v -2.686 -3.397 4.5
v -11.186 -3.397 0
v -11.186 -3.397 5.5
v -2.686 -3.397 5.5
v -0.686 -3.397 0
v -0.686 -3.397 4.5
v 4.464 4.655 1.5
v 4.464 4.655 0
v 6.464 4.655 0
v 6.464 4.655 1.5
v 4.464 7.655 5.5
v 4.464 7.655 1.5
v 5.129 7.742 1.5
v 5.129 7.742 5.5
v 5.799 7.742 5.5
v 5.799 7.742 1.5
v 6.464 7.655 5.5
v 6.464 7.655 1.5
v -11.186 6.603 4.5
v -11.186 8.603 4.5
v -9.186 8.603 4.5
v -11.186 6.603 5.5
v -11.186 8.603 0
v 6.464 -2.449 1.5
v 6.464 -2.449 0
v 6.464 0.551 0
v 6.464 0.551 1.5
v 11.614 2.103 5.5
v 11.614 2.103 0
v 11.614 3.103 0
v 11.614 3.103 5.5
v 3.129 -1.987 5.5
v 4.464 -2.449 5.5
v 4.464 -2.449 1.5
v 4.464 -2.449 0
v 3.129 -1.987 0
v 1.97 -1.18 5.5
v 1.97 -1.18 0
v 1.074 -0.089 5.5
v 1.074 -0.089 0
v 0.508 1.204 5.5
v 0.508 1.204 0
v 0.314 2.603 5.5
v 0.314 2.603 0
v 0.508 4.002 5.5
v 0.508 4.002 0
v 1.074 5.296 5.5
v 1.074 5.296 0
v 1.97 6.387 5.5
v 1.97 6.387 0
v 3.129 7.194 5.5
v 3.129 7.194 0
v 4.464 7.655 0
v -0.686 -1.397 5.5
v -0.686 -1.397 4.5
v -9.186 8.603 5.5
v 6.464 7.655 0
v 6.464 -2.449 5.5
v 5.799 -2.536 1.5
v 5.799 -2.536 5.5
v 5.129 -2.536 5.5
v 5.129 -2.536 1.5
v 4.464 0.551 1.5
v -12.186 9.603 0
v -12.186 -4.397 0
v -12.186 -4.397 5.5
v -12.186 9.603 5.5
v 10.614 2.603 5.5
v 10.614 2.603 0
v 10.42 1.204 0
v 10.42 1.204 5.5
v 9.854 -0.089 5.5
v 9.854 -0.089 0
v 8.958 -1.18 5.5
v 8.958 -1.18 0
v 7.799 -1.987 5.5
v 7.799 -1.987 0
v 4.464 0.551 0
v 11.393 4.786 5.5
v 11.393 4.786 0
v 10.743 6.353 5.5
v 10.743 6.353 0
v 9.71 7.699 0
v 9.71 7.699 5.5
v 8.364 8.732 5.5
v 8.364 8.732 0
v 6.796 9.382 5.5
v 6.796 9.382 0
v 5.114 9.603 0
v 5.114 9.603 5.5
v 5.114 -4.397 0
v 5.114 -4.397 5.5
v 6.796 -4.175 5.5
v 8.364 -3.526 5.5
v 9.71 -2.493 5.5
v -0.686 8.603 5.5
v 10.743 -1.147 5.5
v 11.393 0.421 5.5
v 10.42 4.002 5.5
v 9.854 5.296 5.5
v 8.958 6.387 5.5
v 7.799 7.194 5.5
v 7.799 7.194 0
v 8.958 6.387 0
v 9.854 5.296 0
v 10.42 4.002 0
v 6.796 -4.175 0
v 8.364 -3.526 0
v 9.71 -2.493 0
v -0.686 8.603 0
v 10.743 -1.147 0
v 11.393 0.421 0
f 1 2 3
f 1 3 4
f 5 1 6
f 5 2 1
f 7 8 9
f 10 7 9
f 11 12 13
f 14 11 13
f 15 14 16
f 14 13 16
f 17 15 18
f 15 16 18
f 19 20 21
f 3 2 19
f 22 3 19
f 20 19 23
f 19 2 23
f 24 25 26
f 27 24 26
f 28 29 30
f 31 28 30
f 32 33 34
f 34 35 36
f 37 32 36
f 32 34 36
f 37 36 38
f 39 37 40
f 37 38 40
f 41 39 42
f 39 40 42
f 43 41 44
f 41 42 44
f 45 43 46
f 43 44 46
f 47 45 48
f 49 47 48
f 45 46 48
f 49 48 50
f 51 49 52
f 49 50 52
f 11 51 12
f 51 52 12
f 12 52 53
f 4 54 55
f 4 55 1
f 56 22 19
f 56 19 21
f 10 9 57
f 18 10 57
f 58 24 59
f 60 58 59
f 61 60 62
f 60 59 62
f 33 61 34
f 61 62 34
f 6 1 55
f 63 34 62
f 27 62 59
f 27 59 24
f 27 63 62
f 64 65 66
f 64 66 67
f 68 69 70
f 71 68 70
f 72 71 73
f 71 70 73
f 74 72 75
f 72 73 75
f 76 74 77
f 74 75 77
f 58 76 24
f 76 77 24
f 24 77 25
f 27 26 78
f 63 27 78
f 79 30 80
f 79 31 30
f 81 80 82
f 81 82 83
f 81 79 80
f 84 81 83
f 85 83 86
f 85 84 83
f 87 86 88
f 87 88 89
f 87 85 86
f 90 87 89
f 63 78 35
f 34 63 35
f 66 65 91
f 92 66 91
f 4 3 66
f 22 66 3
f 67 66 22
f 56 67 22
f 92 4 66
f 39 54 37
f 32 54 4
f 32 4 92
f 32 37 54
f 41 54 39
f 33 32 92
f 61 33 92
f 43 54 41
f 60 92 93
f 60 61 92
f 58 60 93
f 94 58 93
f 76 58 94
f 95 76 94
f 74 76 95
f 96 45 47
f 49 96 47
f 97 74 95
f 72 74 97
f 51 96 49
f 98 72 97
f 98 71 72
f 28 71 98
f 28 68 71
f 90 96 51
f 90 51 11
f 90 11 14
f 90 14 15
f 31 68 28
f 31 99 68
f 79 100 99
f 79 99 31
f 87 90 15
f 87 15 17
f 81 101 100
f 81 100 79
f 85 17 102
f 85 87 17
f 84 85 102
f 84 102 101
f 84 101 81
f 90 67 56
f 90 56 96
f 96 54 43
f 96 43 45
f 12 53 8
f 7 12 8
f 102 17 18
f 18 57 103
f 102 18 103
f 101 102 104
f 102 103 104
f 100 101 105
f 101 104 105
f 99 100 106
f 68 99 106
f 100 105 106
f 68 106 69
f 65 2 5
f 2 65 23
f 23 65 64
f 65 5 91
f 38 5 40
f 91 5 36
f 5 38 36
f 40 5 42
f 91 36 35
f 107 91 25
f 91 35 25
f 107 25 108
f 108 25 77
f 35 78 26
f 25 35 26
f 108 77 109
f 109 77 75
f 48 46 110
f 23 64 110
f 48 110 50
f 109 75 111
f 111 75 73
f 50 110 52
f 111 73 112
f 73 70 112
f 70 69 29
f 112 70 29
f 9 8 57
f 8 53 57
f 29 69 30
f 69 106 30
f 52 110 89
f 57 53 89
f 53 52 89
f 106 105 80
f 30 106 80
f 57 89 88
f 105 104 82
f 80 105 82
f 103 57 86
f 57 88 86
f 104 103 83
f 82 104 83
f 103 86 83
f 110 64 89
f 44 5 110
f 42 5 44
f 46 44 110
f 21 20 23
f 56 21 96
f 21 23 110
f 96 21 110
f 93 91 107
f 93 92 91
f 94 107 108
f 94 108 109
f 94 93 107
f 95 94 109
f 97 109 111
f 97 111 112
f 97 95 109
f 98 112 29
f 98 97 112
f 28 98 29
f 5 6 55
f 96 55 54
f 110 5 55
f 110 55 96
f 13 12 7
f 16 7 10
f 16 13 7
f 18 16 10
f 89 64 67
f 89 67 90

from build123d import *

# Parameters (mm, degrees)
F0_W     = 23.8
F0_H     = 14
F0_W_2   = 10.5
F0_H_2   = 12
F1_DEPTH = 5.5
F2_DEPTH = 1.5
F4_DEPTH = 1
F5_R     = 6.5


with BuildPart() as f1:
    # F0 (on Top) → F1 (new body)
    with BuildSketch(Plane.XY):
        with Locations((-0.285932, 2.603267)):
            Rectangle(F0_W, F0_H)
        with Locations((-5.935932, 2.603267)):
            Rectangle(F0_W_2, F0_H_2, mode=Mode.SUBTRACT)
        with BuildLine():
            ThreePointArc((4.464068, 7.655247), (5.464068, 7.753267), (6.464068, 7.655247))
            ThreePointArc((6.464068, 7.655247), (9.443546, 5.87225), (10.614068, 2.603267))
            ThreePointArc((10.614068, 2.603267), (9.443546, -0.665716), (6.464068, -2.448713))
            ThreePointArc((6.464068, -2.448713), (5.464068, -2.546733), (4.464068, -2.448713))
            ThreePointArc((4.464068, -2.448713), (0.314068, 2.603267), (4.464068, 7.655247))
        make_face(mode=Mode.SUBTRACT)
    extrude(amount=F1_DEPTH)

    # F0 (on Top) → F2 (join)
    with BuildSketch(Plane.XY):
        with BuildLine():
            Line((4.464068, 4.655247), (6.464068, 4.655247))
            Line((6.464068, 4.655247), (6.464068, 7.655247))
            ThreePointArc((6.464068, 7.655247), (5.464068, 7.753267), (4.464068, 7.655247))
            Line((4.464068, 7.655247), (4.464068, 4.655247))
        make_face()
        with BuildLine():
            ThreePointArc((4.464068, -2.448713), (5.464068, -2.546733), (6.464068, -2.448713))
            Line((6.464068, -2.448713), (6.464068, 0.551287))
            Line((6.464068, 0.551287), (4.464068, 0.551287))
            Line((4.464068, 0.551287), (4.464068, -2.448713))
        make_face()
    extrude(amount=F2_DEPTH)

    # F3 (on face) → F4 (join)
    with BuildSketch(Plane.XY.offset(5.5)):
        Polygon((-9.185932, 8.603267), (-11.185932, 8.603267), (-11.185932, 6.603267), align=None)
        Polygon((-0.685932, -3.396733), (-0.685932, -1.396733), (-2.685932, -3.396733), align=None)
    extrude(amount=-F4_DEPTH)

    # F5
    f5_edges = [f1.edges().sort_by_distance(p)[0] for p in [
        (11.614068, 9.603267, 2.75),
        (11.614068, -4.396733, 2.75),
    ]]
    fillet(f5_edges, radius=F5_R)


solid = f1.part
